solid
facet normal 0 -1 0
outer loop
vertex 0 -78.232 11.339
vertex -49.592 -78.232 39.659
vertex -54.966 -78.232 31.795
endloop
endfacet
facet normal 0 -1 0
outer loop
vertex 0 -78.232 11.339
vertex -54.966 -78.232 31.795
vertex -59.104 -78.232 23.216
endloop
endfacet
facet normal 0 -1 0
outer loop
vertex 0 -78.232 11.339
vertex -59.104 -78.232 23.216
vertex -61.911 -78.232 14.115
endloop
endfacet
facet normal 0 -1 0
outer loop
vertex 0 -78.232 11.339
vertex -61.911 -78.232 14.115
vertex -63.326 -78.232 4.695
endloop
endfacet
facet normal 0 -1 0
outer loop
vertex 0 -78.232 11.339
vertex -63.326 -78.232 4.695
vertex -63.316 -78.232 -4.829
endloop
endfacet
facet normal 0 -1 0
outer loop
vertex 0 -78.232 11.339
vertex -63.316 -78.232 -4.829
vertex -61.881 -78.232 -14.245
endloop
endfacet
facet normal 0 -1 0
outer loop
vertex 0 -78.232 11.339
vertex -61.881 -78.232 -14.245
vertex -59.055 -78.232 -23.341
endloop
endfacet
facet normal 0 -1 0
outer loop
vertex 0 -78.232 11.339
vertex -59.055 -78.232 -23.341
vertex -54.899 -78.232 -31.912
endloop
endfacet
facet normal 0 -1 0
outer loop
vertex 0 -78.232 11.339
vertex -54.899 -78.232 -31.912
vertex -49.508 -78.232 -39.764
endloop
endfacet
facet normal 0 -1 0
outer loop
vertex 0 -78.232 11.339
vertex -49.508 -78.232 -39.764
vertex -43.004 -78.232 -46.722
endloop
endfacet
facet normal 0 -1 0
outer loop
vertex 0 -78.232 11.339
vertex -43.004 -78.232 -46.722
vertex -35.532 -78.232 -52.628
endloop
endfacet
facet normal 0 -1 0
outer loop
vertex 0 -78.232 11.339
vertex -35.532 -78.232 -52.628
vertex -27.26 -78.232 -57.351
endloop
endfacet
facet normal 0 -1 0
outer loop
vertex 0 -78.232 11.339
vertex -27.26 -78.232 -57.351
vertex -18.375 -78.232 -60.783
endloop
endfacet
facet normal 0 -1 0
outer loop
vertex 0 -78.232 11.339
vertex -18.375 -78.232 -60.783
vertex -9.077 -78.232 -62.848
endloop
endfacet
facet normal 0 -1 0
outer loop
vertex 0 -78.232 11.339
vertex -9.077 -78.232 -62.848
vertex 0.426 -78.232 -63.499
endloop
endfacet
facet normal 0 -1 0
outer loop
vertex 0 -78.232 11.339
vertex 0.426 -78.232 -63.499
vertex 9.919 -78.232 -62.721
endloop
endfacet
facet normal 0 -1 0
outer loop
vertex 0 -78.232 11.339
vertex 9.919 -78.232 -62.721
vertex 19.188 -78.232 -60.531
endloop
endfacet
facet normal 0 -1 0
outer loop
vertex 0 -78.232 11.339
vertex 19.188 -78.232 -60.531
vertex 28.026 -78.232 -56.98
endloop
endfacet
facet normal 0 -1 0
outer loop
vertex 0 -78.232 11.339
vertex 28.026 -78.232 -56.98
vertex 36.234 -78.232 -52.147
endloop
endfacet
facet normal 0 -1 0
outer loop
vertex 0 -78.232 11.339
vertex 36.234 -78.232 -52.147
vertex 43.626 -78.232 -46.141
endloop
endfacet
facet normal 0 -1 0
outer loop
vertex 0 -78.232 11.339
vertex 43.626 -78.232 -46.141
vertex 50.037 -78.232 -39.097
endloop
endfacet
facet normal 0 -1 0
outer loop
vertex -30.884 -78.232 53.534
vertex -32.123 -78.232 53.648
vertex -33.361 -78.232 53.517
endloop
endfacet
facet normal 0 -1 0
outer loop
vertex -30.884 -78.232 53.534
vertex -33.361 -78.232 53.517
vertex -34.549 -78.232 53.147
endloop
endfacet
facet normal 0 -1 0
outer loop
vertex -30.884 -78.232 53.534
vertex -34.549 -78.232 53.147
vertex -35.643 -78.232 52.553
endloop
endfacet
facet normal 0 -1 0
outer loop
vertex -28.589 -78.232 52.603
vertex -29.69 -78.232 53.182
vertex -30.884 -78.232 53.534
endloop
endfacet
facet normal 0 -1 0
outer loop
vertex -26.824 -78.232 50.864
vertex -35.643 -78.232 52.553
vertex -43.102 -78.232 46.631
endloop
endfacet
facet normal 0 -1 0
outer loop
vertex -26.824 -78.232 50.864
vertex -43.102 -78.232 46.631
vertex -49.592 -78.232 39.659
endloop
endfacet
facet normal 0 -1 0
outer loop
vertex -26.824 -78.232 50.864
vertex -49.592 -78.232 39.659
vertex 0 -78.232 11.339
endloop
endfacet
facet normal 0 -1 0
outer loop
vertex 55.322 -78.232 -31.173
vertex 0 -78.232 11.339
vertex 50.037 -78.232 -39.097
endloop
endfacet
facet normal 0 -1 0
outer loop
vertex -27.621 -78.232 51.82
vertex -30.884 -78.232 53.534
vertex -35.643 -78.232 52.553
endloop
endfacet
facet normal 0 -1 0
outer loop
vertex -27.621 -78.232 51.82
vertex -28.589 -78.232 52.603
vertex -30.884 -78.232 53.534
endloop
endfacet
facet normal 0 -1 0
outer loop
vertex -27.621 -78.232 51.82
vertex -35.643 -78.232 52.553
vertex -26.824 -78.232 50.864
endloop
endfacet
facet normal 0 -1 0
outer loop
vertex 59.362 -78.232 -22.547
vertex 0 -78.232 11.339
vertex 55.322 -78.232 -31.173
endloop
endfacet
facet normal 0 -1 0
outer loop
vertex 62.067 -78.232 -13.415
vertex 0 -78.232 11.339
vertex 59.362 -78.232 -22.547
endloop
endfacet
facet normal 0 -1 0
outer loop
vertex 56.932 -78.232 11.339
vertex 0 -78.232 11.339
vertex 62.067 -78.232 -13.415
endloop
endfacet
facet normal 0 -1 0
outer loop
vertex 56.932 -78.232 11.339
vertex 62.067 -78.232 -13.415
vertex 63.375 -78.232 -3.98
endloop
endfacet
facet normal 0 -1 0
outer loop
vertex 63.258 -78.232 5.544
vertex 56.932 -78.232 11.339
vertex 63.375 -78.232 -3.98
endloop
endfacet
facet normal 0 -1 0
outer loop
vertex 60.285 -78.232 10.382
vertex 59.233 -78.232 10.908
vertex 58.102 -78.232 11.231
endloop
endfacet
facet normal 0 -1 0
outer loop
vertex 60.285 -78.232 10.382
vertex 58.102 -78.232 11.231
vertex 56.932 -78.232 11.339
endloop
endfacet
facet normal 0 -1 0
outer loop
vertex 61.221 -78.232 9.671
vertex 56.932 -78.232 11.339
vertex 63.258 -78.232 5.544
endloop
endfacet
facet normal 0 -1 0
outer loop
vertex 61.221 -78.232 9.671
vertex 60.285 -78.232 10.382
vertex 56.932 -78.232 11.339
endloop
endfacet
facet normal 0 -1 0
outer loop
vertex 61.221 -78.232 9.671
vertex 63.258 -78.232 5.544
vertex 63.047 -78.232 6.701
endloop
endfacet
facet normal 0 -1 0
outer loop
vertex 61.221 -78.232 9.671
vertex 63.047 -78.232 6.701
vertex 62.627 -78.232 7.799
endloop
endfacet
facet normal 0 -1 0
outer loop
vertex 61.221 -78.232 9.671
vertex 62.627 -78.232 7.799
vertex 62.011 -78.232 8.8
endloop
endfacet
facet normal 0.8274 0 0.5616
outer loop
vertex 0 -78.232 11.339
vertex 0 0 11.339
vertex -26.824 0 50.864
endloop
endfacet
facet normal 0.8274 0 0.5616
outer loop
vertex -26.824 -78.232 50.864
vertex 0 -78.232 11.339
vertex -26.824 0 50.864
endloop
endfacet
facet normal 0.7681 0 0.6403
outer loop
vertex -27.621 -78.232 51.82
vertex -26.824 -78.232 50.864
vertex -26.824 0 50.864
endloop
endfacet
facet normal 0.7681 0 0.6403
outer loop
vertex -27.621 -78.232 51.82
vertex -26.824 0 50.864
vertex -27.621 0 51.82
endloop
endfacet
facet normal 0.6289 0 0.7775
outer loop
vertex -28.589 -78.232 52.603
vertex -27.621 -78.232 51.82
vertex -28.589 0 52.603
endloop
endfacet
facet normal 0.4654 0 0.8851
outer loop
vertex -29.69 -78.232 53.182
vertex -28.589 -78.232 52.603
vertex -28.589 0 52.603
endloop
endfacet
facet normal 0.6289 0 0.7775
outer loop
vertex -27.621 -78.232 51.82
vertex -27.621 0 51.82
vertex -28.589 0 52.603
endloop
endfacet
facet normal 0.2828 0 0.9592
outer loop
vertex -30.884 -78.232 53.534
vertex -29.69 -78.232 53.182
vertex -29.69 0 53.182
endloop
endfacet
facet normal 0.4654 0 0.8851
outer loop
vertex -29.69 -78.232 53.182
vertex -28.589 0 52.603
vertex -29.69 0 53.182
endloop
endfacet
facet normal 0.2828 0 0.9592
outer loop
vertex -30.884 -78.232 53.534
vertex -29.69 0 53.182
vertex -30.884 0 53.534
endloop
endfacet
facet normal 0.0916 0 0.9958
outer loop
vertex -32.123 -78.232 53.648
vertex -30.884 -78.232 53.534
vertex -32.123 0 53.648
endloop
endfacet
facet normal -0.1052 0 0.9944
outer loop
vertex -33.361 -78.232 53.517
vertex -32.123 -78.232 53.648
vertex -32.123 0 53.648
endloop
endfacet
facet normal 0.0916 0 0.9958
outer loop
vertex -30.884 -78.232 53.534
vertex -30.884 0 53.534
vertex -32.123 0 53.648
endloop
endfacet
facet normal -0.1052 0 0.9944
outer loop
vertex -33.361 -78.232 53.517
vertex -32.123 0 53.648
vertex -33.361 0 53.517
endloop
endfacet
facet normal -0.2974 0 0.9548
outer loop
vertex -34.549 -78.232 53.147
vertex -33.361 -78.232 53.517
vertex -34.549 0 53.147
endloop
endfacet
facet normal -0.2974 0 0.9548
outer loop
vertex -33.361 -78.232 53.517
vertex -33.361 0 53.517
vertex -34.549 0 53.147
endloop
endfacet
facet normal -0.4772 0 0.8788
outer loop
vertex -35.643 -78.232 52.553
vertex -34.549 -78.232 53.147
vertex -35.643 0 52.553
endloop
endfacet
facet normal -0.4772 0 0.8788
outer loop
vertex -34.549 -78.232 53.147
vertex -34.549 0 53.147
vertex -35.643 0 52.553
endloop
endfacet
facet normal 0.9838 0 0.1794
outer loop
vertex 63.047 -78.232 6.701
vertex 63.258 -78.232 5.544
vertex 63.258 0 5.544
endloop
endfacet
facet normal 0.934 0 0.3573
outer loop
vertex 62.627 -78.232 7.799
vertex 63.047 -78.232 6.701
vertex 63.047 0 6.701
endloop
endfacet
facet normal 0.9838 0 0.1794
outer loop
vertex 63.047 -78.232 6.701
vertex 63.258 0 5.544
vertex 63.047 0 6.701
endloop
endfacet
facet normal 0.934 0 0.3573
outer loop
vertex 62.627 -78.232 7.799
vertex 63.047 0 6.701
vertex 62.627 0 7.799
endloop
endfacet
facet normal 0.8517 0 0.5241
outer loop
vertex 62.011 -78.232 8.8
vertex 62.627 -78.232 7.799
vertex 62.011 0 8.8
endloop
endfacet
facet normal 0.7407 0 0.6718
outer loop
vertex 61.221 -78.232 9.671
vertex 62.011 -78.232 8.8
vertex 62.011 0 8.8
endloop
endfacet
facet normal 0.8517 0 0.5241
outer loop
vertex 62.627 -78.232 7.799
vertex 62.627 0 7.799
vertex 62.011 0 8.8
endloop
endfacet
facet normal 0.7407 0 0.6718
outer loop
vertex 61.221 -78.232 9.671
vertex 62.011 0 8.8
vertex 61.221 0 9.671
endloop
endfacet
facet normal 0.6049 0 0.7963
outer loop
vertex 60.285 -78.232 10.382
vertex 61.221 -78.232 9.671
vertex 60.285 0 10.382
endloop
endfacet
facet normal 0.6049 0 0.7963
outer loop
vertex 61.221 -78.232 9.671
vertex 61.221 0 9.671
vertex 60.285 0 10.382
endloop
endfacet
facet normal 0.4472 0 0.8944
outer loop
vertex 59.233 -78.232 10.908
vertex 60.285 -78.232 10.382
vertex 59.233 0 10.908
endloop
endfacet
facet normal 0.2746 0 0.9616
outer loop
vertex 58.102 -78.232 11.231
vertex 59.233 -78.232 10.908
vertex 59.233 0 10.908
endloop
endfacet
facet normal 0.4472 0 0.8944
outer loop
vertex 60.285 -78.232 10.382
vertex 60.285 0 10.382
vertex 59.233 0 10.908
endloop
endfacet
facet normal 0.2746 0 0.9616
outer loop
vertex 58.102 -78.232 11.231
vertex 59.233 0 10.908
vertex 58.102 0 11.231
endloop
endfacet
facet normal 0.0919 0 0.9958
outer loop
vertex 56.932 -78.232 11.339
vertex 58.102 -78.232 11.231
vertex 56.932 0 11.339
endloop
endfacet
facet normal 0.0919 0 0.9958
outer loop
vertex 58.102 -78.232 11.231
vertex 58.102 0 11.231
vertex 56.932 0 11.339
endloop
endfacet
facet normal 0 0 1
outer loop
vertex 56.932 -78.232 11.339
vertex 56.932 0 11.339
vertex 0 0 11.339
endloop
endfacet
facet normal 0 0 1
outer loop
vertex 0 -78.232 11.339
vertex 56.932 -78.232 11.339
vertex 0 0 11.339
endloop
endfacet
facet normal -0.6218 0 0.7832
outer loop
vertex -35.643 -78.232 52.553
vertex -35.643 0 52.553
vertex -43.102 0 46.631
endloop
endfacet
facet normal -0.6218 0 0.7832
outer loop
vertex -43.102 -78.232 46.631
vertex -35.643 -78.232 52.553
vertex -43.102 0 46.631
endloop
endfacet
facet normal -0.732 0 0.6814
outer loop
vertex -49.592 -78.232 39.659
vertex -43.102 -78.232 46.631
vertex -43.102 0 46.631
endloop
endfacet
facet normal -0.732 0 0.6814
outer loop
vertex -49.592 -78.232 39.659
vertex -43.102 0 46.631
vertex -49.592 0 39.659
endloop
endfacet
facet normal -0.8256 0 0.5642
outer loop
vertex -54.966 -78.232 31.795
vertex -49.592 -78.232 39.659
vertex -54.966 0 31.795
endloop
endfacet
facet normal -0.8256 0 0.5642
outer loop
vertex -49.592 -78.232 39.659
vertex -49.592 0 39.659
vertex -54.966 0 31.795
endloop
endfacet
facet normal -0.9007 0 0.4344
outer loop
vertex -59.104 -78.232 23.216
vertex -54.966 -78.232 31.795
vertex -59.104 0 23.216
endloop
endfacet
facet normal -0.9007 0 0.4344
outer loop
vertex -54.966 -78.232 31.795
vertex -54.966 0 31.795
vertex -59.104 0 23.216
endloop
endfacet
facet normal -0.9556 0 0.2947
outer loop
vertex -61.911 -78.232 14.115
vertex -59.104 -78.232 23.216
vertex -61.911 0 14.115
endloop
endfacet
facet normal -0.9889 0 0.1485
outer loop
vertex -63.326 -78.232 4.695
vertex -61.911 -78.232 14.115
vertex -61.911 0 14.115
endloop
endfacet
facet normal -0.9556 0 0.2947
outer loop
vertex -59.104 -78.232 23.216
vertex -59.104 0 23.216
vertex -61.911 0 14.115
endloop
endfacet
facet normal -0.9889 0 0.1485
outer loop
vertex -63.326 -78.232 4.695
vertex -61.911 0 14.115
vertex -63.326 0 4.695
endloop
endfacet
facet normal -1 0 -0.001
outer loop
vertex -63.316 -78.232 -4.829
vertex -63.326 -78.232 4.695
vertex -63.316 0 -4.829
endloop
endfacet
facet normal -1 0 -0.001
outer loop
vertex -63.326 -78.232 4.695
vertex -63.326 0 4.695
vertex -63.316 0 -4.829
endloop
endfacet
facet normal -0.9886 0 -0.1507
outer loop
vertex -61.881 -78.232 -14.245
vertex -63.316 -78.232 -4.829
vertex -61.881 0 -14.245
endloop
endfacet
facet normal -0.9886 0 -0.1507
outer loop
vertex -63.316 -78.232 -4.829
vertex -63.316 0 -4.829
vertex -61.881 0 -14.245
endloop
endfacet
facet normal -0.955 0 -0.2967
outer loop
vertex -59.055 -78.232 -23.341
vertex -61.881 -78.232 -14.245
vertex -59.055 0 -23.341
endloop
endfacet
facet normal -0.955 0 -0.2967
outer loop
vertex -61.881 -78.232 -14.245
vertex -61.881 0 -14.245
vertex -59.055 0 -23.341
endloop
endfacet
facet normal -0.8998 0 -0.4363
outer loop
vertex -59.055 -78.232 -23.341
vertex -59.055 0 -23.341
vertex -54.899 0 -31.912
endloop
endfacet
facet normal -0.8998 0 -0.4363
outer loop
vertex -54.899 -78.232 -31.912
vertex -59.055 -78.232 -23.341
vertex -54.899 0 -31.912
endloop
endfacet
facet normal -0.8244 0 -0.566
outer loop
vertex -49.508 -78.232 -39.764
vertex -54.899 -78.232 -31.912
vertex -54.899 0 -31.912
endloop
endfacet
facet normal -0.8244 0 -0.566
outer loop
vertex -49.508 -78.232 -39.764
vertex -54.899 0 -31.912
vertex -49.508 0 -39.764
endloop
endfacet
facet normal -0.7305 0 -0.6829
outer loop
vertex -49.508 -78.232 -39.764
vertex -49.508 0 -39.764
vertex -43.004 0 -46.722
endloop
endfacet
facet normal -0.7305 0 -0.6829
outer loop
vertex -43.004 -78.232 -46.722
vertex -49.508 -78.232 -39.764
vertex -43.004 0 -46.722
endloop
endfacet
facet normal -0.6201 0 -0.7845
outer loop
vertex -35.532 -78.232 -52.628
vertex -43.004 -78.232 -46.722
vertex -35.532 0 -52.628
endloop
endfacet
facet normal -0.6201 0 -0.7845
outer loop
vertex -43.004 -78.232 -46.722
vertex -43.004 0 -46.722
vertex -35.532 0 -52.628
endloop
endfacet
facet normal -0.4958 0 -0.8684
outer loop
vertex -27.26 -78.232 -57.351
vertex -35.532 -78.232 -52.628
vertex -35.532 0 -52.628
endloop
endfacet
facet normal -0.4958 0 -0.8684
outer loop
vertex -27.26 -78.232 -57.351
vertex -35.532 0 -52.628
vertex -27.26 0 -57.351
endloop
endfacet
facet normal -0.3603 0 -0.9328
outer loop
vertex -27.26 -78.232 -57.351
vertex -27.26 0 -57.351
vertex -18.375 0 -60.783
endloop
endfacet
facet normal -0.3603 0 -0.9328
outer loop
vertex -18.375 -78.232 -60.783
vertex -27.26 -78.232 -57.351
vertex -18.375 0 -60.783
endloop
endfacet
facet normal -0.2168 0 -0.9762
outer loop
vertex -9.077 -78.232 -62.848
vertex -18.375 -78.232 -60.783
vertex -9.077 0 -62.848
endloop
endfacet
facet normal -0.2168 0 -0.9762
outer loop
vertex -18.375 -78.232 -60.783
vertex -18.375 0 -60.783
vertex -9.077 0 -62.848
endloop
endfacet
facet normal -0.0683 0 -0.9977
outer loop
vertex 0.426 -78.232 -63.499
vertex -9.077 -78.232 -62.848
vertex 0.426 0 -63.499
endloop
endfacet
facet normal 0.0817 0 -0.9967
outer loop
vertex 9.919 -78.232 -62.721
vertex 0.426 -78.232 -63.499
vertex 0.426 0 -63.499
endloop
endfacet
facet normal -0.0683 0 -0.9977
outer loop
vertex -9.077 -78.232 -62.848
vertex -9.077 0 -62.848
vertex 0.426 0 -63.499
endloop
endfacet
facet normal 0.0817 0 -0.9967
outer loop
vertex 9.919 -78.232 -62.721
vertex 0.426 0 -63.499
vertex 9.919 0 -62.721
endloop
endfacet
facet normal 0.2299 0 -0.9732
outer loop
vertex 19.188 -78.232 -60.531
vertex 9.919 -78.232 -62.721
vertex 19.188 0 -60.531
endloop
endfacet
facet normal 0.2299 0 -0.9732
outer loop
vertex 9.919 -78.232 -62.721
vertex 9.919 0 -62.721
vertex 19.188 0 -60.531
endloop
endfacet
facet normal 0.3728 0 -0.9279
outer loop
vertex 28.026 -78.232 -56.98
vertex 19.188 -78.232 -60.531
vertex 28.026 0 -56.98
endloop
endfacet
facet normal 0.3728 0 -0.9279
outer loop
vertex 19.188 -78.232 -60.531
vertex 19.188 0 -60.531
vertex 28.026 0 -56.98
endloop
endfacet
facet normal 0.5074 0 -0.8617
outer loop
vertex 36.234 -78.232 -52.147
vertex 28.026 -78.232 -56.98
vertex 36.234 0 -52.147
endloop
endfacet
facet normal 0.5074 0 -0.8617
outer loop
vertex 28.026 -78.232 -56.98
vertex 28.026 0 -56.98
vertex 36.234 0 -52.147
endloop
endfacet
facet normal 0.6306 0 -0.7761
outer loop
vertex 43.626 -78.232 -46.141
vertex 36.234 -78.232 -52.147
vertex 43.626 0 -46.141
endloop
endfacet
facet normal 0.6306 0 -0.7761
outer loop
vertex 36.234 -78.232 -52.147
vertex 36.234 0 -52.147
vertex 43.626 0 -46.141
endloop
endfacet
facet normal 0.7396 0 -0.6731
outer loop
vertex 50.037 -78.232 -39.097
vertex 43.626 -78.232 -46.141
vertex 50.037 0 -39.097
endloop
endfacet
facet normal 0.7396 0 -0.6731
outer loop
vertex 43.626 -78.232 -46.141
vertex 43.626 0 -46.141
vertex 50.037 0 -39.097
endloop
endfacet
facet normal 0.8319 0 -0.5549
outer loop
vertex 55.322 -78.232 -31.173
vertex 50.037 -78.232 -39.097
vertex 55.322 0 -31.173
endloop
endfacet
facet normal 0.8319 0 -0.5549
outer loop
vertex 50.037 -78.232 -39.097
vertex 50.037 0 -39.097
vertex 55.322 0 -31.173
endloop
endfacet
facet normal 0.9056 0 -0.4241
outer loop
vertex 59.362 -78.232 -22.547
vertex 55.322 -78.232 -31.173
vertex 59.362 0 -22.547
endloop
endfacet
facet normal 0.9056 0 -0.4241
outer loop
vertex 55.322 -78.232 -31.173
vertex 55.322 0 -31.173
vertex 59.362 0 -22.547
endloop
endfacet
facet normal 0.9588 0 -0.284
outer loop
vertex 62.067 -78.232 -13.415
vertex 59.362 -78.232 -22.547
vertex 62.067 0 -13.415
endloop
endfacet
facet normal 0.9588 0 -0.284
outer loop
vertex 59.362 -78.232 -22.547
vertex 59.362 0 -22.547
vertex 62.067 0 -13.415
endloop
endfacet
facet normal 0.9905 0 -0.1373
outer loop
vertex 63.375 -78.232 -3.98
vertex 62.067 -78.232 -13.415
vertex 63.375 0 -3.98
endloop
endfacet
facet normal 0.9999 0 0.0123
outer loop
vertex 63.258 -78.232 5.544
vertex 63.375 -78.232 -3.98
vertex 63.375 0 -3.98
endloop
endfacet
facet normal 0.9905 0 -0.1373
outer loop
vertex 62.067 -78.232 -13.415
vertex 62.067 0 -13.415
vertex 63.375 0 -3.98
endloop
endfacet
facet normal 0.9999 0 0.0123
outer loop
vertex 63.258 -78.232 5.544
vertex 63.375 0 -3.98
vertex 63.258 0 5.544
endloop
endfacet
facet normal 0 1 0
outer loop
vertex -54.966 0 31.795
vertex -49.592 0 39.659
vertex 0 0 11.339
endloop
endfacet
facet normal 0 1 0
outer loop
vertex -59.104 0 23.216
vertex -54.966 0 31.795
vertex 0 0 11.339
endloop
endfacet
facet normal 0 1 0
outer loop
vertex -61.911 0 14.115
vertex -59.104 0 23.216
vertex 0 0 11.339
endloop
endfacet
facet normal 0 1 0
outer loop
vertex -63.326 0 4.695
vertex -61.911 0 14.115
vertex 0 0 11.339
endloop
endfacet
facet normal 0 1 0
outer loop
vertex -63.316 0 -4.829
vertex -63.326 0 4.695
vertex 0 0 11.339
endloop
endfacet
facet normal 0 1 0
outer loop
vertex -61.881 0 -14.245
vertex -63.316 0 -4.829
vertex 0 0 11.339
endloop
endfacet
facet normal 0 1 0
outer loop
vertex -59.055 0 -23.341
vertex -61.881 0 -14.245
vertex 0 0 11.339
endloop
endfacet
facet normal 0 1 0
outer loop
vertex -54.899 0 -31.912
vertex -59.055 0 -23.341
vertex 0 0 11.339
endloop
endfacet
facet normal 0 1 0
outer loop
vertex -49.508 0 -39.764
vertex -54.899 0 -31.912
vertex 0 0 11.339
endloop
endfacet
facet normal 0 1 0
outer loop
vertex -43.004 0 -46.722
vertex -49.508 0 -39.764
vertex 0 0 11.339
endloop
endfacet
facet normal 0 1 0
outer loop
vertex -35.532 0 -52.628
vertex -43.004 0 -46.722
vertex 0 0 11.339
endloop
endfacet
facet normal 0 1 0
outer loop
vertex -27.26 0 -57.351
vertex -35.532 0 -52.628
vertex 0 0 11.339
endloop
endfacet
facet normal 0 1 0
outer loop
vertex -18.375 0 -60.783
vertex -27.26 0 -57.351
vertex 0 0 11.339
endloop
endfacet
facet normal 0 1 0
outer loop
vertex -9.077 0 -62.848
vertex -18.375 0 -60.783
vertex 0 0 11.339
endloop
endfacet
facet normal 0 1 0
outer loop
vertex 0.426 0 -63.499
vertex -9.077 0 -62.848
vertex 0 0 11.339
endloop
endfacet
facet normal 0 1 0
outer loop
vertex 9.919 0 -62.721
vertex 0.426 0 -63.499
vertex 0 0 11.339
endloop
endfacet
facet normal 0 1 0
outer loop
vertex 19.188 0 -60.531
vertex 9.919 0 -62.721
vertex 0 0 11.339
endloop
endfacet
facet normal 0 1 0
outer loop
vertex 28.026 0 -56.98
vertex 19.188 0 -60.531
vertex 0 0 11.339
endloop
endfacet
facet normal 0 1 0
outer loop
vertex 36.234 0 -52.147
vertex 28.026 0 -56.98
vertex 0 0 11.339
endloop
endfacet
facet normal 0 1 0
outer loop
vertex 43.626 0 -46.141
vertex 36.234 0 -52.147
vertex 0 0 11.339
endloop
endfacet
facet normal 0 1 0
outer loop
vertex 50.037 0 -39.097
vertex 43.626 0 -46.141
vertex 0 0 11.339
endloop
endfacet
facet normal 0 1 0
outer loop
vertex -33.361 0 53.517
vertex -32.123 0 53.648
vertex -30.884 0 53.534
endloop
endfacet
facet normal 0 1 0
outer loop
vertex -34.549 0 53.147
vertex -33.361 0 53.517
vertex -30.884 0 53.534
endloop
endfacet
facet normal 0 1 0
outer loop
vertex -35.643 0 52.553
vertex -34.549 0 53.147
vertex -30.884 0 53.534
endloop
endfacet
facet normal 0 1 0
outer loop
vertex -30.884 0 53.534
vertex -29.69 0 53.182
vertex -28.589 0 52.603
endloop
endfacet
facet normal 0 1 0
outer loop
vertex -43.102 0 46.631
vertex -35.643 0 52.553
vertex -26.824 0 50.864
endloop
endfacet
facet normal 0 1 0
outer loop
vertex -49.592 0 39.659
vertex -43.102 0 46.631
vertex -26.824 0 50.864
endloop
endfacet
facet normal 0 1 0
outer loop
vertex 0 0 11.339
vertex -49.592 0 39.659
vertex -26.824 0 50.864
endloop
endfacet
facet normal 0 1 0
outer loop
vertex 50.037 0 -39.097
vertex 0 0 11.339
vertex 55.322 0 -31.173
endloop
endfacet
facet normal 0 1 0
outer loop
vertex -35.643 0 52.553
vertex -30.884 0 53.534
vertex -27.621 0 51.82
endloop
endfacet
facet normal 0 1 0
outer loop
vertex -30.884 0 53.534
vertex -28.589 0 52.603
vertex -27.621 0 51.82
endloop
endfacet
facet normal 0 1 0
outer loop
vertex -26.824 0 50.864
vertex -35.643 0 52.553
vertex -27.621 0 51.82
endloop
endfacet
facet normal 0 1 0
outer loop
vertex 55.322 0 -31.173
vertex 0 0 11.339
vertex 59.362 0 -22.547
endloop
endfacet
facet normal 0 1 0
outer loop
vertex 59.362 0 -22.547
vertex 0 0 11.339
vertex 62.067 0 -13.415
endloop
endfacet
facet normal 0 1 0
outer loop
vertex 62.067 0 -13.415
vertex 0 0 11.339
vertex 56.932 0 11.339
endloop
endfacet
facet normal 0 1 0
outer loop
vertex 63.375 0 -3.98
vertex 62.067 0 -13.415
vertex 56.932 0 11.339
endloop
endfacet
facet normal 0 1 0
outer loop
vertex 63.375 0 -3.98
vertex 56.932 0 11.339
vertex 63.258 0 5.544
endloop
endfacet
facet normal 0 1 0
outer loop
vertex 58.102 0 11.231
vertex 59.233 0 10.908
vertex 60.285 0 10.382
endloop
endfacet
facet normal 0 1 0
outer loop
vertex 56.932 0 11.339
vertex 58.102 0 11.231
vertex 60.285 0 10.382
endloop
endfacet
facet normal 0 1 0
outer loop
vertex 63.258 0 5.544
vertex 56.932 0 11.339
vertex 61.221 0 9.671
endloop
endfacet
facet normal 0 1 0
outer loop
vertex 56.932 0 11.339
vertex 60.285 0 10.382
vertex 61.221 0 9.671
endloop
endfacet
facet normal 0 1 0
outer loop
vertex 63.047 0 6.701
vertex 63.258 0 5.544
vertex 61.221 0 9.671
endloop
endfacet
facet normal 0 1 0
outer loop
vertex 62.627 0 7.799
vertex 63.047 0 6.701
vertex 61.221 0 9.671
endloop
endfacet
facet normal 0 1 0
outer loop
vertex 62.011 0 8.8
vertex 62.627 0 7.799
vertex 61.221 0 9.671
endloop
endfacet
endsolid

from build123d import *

# Parameters (mm, degrees)
F1_DEPTH = 78.232


with BuildPart() as f1:
    # F0 (on Front) → F1 (new body)
    with BuildSketch(Plane.XZ):
        with BuildLine():
            ThreePointArc((-26.824391, 50.863773), (-30.883831, 53.534434), (-35.642884, 52.553162))
            ThreePointArc((-35.642884, 52.553162), (-27.260069, -57.351012), (63.257536, 5.543838))
            ThreePointArc((63.257536, 5.543838), (61.221431, 9.671485), (56.931782, 11.339454))
            Line((56.931782, 11.339454), (0, 11.339454))
            Line((0, 11.339454), (-26.824391, 50.863773))
        make_face()
    extrude(amount=F1_DEPTH)


solid = f1.part
